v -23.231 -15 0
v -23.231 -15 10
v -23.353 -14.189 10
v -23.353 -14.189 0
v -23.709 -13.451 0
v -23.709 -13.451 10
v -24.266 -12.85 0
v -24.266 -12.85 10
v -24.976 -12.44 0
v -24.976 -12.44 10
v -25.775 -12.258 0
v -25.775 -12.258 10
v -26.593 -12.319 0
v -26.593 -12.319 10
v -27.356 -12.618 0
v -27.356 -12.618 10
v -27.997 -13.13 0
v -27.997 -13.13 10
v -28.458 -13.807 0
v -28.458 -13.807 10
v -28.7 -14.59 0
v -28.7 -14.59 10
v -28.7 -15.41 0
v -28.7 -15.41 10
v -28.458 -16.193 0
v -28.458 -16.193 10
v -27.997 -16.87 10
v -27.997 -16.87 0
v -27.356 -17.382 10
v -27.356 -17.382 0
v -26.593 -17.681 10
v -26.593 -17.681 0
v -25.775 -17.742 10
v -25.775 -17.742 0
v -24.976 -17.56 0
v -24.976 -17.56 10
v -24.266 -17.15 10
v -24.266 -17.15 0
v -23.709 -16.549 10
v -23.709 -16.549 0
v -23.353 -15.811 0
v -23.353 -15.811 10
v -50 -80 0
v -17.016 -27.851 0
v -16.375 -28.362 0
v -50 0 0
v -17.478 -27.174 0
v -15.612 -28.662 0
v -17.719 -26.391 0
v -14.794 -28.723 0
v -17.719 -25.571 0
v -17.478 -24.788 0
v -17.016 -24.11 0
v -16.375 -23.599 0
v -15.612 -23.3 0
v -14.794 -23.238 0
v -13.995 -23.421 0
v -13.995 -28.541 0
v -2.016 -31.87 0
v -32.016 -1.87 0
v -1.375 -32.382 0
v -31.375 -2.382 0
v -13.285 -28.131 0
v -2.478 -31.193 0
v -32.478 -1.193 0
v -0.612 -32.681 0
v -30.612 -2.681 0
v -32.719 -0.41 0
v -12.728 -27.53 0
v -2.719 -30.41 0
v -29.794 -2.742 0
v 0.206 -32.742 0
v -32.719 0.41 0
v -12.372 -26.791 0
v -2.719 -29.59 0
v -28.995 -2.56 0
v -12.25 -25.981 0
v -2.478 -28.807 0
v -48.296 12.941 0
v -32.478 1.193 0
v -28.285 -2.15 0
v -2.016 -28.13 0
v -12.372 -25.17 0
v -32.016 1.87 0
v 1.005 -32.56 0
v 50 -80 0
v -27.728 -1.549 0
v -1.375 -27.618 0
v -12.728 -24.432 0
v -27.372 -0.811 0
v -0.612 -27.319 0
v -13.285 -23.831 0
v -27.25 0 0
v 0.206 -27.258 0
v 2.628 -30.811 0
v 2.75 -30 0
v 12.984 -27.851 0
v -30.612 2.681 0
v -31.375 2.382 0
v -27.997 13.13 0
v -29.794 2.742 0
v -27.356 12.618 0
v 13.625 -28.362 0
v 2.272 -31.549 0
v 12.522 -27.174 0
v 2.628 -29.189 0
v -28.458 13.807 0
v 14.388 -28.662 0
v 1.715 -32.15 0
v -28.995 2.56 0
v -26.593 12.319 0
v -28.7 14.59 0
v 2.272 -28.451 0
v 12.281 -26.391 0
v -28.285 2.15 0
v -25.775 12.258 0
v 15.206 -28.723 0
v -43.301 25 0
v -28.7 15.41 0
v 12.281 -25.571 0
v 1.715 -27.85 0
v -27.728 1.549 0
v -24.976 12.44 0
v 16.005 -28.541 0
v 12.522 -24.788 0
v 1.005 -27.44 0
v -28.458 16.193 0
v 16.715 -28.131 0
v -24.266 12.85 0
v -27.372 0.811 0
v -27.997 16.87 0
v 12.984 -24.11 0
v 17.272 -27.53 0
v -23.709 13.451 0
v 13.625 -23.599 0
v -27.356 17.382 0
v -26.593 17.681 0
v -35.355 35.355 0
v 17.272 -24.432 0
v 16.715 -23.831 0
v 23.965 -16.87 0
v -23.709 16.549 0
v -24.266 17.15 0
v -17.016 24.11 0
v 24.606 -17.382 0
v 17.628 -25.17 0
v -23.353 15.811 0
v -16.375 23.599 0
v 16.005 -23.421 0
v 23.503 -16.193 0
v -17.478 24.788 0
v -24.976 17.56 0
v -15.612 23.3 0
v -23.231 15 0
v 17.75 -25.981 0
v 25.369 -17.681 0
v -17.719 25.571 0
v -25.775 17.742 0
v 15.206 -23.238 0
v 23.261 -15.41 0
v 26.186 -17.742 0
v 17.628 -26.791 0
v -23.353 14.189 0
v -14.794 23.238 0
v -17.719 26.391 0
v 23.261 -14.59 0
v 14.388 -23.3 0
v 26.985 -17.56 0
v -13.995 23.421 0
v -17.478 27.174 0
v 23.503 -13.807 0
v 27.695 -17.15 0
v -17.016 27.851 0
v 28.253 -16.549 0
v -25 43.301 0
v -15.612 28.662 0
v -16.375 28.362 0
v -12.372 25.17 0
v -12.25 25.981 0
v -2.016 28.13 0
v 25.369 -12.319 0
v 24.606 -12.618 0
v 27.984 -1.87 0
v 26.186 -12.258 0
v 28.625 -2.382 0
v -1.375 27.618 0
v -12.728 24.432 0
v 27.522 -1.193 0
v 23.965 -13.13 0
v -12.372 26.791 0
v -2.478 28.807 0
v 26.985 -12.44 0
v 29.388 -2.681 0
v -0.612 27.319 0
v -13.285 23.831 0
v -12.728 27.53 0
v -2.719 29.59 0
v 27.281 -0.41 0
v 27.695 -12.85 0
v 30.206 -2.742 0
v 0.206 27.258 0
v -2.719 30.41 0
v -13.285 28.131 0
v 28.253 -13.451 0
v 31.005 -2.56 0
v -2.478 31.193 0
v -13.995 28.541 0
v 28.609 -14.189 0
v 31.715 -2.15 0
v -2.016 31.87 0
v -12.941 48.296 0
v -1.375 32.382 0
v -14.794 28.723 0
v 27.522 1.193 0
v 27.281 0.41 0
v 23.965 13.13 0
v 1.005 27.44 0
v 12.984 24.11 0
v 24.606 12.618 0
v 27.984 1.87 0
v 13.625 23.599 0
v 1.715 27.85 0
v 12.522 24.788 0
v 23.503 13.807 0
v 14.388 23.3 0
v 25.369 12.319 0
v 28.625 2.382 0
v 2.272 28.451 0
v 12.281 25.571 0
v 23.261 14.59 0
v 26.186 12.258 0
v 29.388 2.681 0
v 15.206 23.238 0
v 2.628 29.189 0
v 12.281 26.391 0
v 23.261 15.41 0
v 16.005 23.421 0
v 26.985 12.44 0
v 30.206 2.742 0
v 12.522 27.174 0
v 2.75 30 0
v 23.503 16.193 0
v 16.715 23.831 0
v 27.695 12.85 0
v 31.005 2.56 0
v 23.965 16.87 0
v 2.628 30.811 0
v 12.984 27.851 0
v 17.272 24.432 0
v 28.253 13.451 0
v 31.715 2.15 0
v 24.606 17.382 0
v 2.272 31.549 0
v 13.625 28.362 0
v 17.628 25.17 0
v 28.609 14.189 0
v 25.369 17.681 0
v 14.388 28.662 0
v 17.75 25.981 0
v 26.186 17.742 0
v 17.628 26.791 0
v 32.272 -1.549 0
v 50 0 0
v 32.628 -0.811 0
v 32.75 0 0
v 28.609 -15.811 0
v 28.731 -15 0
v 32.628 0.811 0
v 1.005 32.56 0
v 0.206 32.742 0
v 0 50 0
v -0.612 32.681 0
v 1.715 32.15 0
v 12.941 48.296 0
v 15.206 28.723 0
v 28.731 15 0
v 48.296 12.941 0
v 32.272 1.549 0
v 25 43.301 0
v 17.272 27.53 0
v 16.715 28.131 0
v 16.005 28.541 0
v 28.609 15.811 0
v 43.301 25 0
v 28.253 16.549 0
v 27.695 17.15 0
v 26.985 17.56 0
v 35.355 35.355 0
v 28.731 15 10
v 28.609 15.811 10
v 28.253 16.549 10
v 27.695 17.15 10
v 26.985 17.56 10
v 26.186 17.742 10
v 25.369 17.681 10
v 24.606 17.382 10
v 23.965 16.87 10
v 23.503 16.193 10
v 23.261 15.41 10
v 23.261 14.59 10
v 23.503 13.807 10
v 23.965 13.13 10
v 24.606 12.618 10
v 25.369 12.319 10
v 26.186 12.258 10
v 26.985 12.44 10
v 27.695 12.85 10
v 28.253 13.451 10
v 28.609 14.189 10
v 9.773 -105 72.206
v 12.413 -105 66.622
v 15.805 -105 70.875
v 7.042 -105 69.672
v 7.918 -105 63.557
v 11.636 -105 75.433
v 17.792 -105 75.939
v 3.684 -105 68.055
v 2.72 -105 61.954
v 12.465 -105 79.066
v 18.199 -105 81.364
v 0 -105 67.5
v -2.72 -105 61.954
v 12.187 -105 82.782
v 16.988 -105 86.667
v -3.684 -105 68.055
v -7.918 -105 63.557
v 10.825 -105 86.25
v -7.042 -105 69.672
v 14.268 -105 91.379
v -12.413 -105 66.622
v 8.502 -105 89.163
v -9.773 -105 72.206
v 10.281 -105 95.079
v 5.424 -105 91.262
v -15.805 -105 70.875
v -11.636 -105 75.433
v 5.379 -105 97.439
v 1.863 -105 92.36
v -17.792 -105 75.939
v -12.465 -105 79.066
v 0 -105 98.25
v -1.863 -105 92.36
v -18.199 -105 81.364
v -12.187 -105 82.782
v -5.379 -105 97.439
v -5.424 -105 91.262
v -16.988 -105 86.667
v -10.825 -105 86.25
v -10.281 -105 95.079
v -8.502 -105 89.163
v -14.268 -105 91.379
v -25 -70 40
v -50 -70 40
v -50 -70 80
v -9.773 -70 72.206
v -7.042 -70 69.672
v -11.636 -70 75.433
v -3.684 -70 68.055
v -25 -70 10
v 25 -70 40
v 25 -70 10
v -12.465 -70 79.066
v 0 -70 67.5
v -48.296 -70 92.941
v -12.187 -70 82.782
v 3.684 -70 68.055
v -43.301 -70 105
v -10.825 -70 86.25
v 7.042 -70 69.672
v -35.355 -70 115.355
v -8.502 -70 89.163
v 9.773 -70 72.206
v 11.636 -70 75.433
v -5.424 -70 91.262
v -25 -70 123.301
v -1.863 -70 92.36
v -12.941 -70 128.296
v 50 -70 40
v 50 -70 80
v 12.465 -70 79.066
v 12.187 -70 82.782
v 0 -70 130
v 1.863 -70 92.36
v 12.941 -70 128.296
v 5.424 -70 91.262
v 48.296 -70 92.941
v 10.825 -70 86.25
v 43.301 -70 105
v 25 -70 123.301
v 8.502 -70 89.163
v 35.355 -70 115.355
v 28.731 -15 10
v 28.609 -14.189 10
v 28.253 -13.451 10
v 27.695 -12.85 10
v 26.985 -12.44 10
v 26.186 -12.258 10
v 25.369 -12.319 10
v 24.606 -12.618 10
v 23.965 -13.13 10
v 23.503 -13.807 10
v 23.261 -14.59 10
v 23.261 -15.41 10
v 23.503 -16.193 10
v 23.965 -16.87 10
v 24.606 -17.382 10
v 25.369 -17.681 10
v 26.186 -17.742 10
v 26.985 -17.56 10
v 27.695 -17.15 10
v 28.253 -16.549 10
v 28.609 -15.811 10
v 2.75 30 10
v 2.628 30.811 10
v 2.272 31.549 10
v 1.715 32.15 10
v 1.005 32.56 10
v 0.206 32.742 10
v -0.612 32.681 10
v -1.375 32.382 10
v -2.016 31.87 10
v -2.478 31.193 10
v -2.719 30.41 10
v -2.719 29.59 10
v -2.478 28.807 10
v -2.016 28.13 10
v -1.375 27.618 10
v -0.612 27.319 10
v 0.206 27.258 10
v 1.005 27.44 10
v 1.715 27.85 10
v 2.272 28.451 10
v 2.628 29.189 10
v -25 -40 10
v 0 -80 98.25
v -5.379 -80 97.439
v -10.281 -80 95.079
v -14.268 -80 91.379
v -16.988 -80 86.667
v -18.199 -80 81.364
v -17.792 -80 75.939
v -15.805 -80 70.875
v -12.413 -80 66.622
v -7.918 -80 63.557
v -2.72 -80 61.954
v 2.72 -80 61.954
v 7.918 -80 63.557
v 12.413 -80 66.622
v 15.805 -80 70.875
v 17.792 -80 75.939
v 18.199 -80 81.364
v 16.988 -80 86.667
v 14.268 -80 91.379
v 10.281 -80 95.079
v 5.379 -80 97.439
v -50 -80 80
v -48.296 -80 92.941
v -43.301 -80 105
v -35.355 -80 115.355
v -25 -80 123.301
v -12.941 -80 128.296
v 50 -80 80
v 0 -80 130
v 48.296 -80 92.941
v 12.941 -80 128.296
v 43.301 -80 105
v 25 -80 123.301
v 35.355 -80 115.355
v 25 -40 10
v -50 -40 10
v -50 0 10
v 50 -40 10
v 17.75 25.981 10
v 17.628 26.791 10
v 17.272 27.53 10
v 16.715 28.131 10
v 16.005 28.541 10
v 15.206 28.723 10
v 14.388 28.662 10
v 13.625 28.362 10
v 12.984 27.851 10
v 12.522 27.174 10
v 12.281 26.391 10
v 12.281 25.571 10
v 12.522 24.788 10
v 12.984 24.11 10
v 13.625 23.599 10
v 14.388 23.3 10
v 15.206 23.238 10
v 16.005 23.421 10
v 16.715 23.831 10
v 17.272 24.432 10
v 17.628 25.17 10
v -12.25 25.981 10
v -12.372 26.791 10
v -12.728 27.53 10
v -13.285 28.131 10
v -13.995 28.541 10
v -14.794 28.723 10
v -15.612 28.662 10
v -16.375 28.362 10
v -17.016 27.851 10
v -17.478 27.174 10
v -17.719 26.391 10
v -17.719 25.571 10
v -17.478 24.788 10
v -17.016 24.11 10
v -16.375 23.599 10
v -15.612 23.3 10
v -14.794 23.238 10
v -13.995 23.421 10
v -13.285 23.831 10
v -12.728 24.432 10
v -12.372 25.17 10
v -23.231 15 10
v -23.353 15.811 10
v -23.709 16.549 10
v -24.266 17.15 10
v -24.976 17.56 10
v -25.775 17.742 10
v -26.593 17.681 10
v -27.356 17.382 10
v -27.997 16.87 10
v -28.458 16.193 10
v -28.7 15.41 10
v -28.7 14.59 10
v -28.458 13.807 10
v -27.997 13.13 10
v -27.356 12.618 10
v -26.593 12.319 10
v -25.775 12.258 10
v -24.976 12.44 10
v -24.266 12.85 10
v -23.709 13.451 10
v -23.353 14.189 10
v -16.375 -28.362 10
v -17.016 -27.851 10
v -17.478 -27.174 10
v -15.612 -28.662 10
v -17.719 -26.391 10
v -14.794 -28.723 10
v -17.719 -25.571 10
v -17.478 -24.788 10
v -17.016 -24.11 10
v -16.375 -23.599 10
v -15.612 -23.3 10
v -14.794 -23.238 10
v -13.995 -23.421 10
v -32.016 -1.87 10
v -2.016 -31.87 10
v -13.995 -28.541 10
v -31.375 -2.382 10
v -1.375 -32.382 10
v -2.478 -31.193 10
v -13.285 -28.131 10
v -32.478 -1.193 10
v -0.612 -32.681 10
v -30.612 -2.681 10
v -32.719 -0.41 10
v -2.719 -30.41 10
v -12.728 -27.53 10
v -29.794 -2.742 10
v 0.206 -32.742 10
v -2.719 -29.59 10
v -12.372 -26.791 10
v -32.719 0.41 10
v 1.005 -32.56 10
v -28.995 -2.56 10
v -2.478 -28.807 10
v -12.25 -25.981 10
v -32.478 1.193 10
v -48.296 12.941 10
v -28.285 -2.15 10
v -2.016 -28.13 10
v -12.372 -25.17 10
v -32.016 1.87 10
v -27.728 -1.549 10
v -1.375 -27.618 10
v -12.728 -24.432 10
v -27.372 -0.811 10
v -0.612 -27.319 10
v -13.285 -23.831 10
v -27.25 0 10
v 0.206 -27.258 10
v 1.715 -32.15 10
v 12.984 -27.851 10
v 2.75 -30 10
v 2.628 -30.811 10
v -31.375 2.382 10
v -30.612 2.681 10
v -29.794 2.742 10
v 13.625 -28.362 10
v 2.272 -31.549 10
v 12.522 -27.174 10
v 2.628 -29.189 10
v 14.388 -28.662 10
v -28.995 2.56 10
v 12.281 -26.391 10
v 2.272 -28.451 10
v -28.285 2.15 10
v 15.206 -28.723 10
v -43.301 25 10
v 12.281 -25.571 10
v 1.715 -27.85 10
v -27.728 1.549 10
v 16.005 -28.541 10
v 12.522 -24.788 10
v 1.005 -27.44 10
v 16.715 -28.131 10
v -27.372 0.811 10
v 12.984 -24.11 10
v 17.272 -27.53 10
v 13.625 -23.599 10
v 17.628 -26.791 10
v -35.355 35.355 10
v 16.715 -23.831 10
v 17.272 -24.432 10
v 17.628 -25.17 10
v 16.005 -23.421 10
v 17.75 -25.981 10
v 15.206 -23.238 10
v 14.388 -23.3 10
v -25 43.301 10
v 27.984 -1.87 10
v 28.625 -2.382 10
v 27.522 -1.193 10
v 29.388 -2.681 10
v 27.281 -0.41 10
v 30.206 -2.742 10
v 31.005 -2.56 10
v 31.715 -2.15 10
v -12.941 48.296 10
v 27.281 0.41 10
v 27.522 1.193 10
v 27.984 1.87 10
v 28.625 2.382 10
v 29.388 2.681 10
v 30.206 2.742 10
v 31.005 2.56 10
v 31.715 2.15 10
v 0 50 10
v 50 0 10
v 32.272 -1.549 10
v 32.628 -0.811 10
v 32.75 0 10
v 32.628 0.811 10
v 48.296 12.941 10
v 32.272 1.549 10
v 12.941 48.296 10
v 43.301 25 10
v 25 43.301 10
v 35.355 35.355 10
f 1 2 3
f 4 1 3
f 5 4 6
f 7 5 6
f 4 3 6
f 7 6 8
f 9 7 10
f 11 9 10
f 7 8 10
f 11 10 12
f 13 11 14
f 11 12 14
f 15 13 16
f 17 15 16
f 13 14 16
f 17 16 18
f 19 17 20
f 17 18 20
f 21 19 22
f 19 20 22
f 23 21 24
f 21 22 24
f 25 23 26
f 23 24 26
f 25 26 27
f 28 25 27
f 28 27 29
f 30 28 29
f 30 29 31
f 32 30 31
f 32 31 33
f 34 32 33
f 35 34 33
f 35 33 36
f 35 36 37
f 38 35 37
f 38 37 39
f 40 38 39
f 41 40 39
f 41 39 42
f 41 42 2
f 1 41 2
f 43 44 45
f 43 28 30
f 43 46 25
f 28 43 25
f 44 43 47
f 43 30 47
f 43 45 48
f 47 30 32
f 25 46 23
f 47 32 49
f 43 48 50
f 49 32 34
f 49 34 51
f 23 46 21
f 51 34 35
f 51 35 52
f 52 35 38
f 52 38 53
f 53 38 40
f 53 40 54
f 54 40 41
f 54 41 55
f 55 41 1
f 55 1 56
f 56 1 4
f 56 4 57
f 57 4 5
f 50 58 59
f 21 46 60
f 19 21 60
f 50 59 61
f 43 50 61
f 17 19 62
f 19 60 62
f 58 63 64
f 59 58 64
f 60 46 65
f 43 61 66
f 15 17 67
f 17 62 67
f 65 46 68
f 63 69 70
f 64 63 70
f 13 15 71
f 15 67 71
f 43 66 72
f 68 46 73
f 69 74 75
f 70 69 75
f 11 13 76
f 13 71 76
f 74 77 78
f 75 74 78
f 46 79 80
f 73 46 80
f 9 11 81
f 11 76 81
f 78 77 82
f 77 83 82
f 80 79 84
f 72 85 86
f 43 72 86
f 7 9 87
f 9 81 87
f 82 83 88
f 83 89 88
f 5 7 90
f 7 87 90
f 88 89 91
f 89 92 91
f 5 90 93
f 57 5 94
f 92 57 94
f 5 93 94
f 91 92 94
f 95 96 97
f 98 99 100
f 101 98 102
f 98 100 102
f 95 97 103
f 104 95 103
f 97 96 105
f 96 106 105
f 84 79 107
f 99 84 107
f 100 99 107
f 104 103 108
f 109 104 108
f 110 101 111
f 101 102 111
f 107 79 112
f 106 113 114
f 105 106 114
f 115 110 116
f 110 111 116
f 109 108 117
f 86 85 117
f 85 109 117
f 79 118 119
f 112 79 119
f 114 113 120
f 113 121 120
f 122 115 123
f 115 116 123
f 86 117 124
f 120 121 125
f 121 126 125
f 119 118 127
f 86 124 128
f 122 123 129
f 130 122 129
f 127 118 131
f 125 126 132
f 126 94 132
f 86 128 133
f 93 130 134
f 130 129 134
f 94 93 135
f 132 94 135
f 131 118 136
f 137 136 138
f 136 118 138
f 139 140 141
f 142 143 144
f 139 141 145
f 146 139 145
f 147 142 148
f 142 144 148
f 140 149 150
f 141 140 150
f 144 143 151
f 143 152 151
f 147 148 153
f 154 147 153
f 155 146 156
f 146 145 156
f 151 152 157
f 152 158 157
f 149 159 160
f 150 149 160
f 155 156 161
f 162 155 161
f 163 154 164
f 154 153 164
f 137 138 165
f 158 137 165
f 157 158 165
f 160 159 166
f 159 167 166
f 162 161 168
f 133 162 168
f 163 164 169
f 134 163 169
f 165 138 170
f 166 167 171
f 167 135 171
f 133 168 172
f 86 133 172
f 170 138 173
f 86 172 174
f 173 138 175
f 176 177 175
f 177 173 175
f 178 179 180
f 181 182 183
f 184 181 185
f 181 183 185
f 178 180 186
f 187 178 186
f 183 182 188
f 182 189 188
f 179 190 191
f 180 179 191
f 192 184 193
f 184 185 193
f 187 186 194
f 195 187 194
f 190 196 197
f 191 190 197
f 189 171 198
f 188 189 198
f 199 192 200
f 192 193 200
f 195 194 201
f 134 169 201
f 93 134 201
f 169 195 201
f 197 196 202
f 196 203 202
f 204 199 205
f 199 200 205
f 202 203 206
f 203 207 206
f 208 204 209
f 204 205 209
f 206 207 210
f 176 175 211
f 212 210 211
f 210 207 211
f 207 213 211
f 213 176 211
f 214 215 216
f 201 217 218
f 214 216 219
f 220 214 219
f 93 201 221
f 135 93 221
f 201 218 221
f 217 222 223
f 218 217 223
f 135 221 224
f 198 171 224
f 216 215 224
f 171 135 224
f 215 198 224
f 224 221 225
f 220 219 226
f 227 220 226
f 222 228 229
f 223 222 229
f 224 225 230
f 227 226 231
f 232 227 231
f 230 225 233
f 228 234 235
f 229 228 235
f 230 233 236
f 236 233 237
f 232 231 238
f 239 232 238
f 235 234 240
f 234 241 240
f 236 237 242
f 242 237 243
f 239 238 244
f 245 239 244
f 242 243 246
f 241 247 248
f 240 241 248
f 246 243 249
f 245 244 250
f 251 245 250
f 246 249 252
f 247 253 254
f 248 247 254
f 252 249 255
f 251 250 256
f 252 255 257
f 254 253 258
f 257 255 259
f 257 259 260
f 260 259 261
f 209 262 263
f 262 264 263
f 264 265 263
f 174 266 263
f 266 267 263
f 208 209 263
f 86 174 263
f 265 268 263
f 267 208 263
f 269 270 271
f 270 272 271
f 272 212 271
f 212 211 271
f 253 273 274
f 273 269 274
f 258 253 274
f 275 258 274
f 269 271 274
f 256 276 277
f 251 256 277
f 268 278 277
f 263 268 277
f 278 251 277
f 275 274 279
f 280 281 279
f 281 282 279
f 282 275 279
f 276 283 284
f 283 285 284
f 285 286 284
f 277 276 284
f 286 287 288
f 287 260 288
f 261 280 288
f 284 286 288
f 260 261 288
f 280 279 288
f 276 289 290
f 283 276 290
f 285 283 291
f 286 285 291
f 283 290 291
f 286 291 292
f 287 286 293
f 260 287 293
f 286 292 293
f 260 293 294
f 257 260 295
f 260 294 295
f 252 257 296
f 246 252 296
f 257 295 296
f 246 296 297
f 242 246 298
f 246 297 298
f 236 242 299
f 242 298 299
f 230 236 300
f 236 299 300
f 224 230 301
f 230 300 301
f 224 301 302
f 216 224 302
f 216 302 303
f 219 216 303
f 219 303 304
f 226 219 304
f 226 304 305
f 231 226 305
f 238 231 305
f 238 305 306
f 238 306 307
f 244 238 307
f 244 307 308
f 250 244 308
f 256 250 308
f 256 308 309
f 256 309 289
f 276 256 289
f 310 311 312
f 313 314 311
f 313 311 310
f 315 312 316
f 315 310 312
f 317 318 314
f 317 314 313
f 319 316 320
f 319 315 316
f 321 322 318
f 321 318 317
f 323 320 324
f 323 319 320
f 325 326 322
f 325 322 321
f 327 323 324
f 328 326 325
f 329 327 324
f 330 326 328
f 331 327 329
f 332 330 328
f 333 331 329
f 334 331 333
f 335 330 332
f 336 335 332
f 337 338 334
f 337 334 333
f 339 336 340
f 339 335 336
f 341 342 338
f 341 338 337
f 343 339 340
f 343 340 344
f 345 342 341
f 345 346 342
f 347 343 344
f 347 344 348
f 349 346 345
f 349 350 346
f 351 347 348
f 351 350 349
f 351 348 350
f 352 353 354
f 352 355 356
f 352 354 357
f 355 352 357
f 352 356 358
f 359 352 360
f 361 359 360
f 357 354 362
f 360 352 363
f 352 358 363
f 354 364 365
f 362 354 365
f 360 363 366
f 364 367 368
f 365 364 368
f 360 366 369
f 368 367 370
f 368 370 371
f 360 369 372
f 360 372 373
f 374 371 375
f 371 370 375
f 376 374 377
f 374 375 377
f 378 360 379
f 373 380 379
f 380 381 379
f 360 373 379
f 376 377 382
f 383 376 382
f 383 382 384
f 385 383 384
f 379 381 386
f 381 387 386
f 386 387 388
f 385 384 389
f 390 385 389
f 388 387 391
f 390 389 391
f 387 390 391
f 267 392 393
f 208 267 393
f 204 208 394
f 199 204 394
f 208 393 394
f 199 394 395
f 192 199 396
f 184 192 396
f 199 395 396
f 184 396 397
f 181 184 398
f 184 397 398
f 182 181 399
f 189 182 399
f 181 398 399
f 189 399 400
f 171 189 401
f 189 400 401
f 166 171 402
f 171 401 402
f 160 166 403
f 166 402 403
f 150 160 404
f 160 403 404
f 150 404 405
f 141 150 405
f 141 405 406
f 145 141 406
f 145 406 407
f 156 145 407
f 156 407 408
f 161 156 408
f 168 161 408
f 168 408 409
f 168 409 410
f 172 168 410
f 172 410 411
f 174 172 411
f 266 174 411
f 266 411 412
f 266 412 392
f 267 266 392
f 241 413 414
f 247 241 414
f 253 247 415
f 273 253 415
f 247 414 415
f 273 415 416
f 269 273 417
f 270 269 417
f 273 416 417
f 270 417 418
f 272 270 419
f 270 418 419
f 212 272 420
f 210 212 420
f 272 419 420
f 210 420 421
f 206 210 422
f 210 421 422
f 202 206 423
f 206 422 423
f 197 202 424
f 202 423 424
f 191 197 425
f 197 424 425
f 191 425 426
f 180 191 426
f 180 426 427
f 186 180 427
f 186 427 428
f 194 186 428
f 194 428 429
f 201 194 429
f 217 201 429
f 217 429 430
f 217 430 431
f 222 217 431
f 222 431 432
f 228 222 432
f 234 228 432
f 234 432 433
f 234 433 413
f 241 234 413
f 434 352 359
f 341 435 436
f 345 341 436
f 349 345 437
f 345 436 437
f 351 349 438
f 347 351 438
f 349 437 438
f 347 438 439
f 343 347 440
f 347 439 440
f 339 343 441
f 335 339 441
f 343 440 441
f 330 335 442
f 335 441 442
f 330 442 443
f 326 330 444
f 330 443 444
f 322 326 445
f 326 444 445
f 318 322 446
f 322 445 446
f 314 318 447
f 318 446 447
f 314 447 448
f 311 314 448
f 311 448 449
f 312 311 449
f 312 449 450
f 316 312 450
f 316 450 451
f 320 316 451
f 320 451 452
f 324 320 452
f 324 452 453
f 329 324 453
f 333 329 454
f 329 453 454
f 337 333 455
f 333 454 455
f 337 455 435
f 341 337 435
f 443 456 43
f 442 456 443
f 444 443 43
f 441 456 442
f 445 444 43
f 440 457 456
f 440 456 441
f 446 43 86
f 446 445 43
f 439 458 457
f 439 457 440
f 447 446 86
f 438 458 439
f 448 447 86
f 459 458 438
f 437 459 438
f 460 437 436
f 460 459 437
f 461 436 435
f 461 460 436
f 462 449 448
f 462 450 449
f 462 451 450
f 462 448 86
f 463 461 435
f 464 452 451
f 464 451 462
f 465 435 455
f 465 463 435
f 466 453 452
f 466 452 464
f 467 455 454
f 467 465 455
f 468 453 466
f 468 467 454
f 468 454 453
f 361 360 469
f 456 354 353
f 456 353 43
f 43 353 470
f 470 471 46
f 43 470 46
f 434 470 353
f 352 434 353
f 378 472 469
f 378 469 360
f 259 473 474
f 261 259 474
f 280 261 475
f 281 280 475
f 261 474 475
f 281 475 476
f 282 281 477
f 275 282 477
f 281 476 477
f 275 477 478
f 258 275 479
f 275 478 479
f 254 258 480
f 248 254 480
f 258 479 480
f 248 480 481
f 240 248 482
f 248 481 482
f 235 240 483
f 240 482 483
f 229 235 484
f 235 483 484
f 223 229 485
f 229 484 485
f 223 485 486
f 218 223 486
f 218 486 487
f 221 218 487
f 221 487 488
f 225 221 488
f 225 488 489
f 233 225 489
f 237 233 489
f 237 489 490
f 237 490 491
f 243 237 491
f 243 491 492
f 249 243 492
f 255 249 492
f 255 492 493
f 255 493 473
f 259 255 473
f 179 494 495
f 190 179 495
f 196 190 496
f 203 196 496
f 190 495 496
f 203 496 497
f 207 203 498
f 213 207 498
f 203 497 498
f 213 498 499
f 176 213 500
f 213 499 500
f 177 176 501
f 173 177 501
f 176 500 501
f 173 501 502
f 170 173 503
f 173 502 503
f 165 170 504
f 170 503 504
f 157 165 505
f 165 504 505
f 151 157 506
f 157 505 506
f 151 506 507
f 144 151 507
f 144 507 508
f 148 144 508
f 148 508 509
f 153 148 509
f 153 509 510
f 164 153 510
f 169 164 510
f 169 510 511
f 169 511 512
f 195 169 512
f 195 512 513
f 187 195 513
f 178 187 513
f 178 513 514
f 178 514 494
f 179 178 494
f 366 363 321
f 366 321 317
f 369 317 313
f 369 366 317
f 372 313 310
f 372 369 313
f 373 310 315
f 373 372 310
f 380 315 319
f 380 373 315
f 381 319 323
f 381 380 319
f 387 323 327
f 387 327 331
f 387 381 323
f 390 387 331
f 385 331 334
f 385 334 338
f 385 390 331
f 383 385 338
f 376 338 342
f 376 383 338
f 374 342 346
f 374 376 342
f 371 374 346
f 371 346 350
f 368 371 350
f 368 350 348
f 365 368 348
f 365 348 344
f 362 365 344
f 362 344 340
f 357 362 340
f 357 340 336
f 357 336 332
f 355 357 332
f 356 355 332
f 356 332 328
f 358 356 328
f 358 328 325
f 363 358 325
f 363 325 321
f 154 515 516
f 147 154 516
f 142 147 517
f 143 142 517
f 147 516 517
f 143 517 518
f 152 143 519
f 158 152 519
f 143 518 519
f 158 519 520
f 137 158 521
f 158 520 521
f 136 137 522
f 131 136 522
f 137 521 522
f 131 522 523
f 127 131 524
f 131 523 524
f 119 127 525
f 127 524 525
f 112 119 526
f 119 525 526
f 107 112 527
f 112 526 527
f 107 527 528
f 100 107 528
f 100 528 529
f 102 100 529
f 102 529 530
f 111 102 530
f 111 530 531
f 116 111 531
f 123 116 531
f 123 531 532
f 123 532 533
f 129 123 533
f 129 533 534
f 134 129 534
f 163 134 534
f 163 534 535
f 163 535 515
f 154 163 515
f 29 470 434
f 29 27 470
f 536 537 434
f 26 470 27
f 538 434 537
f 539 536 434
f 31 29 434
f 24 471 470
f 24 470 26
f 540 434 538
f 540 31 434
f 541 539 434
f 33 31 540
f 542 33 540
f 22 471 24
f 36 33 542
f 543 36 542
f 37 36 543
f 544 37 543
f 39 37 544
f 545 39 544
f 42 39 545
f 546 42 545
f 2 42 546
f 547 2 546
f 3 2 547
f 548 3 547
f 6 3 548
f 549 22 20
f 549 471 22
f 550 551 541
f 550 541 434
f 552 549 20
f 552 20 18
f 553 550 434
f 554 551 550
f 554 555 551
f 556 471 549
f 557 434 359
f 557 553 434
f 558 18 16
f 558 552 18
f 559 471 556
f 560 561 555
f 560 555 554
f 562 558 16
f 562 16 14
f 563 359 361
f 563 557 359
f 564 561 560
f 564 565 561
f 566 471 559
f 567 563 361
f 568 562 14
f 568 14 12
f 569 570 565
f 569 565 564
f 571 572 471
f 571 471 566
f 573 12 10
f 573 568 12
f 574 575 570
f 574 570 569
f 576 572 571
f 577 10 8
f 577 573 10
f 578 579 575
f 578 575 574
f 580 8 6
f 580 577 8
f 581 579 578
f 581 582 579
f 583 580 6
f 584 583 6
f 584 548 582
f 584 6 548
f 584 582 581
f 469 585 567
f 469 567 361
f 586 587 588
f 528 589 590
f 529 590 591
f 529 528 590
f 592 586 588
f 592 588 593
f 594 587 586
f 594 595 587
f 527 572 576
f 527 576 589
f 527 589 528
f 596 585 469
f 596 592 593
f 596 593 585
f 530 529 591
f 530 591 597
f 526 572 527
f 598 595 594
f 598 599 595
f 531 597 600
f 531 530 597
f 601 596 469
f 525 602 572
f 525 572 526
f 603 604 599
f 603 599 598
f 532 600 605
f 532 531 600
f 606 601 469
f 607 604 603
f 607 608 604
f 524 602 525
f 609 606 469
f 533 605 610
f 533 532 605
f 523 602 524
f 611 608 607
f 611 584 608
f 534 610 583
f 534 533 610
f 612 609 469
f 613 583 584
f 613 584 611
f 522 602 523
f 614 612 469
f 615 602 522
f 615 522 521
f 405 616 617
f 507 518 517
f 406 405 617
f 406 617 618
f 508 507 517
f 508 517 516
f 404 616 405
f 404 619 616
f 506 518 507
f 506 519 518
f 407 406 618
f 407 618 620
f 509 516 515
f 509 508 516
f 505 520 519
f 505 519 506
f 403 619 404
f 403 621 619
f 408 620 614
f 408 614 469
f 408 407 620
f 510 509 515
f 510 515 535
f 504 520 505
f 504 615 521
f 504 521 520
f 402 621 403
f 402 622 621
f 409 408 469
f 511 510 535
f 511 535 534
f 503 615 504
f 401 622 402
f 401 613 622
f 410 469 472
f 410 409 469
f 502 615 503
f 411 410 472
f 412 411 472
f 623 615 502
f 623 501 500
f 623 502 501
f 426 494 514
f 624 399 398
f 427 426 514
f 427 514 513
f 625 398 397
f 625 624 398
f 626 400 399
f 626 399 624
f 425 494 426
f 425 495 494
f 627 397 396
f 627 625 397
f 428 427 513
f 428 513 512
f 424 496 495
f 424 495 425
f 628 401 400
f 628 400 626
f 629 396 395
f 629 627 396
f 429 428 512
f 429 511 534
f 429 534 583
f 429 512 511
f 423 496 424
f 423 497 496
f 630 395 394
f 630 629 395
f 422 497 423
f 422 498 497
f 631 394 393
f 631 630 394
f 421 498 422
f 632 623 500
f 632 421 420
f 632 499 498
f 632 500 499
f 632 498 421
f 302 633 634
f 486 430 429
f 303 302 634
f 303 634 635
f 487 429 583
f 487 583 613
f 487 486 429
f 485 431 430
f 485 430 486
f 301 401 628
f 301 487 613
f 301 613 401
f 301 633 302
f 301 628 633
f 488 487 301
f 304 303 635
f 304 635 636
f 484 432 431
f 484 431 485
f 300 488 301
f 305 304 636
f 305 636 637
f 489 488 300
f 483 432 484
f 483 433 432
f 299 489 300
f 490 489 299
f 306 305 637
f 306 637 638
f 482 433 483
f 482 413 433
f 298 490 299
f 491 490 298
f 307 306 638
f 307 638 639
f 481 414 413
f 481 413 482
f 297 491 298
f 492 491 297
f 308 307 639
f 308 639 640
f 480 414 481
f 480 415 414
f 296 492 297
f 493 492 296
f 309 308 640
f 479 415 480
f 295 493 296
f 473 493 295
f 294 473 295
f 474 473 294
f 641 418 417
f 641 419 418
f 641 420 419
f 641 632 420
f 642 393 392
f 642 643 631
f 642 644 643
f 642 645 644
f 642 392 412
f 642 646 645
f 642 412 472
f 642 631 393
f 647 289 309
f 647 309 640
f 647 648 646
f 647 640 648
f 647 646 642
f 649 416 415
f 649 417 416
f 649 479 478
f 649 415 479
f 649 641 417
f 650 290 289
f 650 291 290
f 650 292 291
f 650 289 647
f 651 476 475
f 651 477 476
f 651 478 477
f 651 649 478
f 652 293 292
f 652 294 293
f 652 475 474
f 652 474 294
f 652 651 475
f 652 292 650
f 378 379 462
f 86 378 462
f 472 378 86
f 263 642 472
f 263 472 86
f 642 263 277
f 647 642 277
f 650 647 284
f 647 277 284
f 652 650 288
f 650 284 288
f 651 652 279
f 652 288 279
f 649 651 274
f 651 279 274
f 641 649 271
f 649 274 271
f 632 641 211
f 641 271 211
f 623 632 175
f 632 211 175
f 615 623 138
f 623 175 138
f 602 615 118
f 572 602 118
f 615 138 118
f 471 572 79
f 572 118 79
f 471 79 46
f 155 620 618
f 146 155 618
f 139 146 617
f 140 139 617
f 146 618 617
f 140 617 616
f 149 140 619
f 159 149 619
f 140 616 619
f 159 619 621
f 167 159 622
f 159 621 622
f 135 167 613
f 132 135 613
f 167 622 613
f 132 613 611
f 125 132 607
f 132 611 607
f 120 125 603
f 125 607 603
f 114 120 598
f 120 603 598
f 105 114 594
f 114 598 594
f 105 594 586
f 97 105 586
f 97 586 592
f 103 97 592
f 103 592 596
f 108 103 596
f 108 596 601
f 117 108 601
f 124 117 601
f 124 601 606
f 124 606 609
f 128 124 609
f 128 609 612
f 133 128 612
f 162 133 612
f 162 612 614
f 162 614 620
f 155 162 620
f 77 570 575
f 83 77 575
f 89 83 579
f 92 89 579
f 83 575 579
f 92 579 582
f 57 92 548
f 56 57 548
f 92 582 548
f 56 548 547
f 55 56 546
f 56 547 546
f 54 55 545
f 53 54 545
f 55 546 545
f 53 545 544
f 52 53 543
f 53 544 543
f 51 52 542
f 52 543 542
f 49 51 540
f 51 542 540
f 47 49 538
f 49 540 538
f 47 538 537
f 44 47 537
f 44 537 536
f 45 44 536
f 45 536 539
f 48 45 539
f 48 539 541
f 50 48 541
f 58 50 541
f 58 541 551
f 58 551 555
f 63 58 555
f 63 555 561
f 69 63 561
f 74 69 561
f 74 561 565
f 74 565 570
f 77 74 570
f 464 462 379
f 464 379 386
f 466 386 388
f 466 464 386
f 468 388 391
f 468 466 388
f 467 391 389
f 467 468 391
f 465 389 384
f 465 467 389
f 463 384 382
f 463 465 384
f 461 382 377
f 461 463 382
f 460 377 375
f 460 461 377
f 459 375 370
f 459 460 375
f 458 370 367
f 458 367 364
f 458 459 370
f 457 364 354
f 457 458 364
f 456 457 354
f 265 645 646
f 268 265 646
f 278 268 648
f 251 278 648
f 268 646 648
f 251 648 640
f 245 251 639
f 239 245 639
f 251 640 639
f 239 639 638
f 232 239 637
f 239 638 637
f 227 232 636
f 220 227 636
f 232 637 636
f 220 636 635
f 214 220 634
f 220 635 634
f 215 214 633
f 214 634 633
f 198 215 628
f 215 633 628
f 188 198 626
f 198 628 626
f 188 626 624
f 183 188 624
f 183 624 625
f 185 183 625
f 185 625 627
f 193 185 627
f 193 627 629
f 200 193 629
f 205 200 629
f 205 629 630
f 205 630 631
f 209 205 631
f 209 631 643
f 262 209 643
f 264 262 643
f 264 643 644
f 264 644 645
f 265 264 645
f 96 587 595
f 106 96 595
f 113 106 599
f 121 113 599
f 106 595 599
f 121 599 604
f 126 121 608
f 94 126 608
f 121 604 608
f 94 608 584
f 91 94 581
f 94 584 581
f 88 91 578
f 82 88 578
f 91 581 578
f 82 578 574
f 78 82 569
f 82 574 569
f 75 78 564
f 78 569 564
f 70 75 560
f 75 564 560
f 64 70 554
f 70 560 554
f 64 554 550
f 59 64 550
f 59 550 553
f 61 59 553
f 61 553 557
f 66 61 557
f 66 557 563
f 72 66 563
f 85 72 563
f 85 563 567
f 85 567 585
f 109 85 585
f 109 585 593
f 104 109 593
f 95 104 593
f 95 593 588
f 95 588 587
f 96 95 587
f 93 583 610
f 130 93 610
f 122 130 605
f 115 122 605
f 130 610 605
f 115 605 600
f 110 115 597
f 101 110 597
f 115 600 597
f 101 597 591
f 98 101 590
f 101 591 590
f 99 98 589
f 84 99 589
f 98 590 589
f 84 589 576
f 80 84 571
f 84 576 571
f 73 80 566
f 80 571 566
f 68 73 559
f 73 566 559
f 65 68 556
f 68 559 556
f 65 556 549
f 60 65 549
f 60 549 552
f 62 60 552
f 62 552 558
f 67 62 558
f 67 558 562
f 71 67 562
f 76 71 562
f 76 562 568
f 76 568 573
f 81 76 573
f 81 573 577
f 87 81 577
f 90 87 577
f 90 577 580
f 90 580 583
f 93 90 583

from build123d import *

# Parameters (mm, degrees)
EXTRUDE_1_DEPTH     = 10
EXTRUDE_2_DEPTH     = 10
EXTRUDE_3_DEPTH     = 25
EXTRUDE_4_DEPTH     = 25
SKETCH_5_R          = 2.75
CUT_EXTRUDE_1_DEPTH = 25
SKETCH_6_R          = 18.25
SKETCH_6_R_2        = 12.5
EXTRUDE_5_DEPTH     = 25
CUT_EXTRUDE_START   = -10
SKETCH_7_R          = 12.5
CUT_EXTRUDE_2_DEPTH = 10


with BuildPart() as part:
    # 草图1 → 凸台-拉伸1 (new body)
    with BuildSketch(Plane.XY):
        with BuildLine():
            Line((-50, 0), (-50, -80))
            Line((-50, -80), (50, -80))
            Line((50, -80), (50, 0))
            ThreePointArc((50, 0), (0, 50), (-50, 0))
        make_face()
    extrude(amount=EXTRUDE_1_DEPTH)

    # 草图2 → 凸台-拉伸2 (add)
    with BuildSketch(Plane.XZ.offset(80)):
        with BuildLine():
            Line((50, 10), (50, 80))
            ThreePointArc((50, 80), (0, 130), (-50, 80))
            Line((-50, 80), (-50, 10))
            Line((-50, 10), (50, 10))
        make_face()
    extrude(amount=-EXTRUDE_2_DEPTH)

    # 草图3 → 凸台-拉伸3 (add)
    with BuildSketch(Plane.ZY.offset(50)):
        Polygon((10, -40), (40, -70), (10, -70), align=None)
    extrude(amount=-EXTRUDE_3_DEPTH)

    # 草图4 → 凸台-拉伸4 (add)
    with BuildSketch(Plane(origin=(50, 0, 0), x_dir=(0, 0, -1), z_dir=(1, 0, 0))):
        Polygon((-10, -70), (-10, -40), (-40, -70), align=None)
    extrude(amount=-EXTRUDE_4_DEPTH)

    # 草图5 → 切除-拉伸1 (cut)
    with BuildSketch(Plane.XY.offset(10)):
        with Locations((0, 30)):
            Circle(SKETCH_5_R)
        with Locations((30, 0)):
            Circle(SKETCH_5_R)
        with Locations((0, -30)):
            Circle(SKETCH_5_R)
        with Locations((-30, 0)):
            Circle(SKETCH_5_R)
        with Locations((15, 25.980762114)):
            Circle(SKETCH_5_R)
        with Locations((25.980762114, 15)):
            Circle(SKETCH_5_R)
        with Locations((15, -25.980762114)):
            Circle(SKETCH_5_R)
        with Locations((25.980762114, -15)):
            Circle(SKETCH_5_R)
        with Locations((-15, 25.980762114)):
            Circle(SKETCH_5_R)
        with Locations((-25.980762114, 15)):
            Circle(SKETCH_5_R)
        with Locations((-25.980762114, -15)):
            Circle(SKETCH_5_R)
        with Locations((-15, -25.980762114)):
            Circle(SKETCH_5_R)
    extrude(amount=-CUT_EXTRUDE_1_DEPTH, mode=Mode.SUBTRACT)

    # 草图6 → 凸台-拉伸5 (add)
    with BuildSketch(Plane.XZ.offset(80)):
        with Locations(Location((0, 80, 0), (0, 0, 90))):
            Circle(SKETCH_6_R)
        with Locations(Location((0, 80, 0), (0, 0, 270))):
            Circle(SKETCH_6_R_2, mode=Mode.SUBTRACT)
    extrude(amount=EXTRUDE_5_DEPTH)

    # 草图7 → 切除-拉伸2 (cut)
    with BuildSketch(Plane.XZ.offset(80).offset(CUT_EXTRUDE_START)):
        with Locations(Location((0, 80, 0), (0, 0, 270))):
            Circle(SKETCH_7_R)
    extrude(amount=CUT_EXTRUDE_2_DEPTH, mode=Mode.SUBTRACT)


solid = part.part
